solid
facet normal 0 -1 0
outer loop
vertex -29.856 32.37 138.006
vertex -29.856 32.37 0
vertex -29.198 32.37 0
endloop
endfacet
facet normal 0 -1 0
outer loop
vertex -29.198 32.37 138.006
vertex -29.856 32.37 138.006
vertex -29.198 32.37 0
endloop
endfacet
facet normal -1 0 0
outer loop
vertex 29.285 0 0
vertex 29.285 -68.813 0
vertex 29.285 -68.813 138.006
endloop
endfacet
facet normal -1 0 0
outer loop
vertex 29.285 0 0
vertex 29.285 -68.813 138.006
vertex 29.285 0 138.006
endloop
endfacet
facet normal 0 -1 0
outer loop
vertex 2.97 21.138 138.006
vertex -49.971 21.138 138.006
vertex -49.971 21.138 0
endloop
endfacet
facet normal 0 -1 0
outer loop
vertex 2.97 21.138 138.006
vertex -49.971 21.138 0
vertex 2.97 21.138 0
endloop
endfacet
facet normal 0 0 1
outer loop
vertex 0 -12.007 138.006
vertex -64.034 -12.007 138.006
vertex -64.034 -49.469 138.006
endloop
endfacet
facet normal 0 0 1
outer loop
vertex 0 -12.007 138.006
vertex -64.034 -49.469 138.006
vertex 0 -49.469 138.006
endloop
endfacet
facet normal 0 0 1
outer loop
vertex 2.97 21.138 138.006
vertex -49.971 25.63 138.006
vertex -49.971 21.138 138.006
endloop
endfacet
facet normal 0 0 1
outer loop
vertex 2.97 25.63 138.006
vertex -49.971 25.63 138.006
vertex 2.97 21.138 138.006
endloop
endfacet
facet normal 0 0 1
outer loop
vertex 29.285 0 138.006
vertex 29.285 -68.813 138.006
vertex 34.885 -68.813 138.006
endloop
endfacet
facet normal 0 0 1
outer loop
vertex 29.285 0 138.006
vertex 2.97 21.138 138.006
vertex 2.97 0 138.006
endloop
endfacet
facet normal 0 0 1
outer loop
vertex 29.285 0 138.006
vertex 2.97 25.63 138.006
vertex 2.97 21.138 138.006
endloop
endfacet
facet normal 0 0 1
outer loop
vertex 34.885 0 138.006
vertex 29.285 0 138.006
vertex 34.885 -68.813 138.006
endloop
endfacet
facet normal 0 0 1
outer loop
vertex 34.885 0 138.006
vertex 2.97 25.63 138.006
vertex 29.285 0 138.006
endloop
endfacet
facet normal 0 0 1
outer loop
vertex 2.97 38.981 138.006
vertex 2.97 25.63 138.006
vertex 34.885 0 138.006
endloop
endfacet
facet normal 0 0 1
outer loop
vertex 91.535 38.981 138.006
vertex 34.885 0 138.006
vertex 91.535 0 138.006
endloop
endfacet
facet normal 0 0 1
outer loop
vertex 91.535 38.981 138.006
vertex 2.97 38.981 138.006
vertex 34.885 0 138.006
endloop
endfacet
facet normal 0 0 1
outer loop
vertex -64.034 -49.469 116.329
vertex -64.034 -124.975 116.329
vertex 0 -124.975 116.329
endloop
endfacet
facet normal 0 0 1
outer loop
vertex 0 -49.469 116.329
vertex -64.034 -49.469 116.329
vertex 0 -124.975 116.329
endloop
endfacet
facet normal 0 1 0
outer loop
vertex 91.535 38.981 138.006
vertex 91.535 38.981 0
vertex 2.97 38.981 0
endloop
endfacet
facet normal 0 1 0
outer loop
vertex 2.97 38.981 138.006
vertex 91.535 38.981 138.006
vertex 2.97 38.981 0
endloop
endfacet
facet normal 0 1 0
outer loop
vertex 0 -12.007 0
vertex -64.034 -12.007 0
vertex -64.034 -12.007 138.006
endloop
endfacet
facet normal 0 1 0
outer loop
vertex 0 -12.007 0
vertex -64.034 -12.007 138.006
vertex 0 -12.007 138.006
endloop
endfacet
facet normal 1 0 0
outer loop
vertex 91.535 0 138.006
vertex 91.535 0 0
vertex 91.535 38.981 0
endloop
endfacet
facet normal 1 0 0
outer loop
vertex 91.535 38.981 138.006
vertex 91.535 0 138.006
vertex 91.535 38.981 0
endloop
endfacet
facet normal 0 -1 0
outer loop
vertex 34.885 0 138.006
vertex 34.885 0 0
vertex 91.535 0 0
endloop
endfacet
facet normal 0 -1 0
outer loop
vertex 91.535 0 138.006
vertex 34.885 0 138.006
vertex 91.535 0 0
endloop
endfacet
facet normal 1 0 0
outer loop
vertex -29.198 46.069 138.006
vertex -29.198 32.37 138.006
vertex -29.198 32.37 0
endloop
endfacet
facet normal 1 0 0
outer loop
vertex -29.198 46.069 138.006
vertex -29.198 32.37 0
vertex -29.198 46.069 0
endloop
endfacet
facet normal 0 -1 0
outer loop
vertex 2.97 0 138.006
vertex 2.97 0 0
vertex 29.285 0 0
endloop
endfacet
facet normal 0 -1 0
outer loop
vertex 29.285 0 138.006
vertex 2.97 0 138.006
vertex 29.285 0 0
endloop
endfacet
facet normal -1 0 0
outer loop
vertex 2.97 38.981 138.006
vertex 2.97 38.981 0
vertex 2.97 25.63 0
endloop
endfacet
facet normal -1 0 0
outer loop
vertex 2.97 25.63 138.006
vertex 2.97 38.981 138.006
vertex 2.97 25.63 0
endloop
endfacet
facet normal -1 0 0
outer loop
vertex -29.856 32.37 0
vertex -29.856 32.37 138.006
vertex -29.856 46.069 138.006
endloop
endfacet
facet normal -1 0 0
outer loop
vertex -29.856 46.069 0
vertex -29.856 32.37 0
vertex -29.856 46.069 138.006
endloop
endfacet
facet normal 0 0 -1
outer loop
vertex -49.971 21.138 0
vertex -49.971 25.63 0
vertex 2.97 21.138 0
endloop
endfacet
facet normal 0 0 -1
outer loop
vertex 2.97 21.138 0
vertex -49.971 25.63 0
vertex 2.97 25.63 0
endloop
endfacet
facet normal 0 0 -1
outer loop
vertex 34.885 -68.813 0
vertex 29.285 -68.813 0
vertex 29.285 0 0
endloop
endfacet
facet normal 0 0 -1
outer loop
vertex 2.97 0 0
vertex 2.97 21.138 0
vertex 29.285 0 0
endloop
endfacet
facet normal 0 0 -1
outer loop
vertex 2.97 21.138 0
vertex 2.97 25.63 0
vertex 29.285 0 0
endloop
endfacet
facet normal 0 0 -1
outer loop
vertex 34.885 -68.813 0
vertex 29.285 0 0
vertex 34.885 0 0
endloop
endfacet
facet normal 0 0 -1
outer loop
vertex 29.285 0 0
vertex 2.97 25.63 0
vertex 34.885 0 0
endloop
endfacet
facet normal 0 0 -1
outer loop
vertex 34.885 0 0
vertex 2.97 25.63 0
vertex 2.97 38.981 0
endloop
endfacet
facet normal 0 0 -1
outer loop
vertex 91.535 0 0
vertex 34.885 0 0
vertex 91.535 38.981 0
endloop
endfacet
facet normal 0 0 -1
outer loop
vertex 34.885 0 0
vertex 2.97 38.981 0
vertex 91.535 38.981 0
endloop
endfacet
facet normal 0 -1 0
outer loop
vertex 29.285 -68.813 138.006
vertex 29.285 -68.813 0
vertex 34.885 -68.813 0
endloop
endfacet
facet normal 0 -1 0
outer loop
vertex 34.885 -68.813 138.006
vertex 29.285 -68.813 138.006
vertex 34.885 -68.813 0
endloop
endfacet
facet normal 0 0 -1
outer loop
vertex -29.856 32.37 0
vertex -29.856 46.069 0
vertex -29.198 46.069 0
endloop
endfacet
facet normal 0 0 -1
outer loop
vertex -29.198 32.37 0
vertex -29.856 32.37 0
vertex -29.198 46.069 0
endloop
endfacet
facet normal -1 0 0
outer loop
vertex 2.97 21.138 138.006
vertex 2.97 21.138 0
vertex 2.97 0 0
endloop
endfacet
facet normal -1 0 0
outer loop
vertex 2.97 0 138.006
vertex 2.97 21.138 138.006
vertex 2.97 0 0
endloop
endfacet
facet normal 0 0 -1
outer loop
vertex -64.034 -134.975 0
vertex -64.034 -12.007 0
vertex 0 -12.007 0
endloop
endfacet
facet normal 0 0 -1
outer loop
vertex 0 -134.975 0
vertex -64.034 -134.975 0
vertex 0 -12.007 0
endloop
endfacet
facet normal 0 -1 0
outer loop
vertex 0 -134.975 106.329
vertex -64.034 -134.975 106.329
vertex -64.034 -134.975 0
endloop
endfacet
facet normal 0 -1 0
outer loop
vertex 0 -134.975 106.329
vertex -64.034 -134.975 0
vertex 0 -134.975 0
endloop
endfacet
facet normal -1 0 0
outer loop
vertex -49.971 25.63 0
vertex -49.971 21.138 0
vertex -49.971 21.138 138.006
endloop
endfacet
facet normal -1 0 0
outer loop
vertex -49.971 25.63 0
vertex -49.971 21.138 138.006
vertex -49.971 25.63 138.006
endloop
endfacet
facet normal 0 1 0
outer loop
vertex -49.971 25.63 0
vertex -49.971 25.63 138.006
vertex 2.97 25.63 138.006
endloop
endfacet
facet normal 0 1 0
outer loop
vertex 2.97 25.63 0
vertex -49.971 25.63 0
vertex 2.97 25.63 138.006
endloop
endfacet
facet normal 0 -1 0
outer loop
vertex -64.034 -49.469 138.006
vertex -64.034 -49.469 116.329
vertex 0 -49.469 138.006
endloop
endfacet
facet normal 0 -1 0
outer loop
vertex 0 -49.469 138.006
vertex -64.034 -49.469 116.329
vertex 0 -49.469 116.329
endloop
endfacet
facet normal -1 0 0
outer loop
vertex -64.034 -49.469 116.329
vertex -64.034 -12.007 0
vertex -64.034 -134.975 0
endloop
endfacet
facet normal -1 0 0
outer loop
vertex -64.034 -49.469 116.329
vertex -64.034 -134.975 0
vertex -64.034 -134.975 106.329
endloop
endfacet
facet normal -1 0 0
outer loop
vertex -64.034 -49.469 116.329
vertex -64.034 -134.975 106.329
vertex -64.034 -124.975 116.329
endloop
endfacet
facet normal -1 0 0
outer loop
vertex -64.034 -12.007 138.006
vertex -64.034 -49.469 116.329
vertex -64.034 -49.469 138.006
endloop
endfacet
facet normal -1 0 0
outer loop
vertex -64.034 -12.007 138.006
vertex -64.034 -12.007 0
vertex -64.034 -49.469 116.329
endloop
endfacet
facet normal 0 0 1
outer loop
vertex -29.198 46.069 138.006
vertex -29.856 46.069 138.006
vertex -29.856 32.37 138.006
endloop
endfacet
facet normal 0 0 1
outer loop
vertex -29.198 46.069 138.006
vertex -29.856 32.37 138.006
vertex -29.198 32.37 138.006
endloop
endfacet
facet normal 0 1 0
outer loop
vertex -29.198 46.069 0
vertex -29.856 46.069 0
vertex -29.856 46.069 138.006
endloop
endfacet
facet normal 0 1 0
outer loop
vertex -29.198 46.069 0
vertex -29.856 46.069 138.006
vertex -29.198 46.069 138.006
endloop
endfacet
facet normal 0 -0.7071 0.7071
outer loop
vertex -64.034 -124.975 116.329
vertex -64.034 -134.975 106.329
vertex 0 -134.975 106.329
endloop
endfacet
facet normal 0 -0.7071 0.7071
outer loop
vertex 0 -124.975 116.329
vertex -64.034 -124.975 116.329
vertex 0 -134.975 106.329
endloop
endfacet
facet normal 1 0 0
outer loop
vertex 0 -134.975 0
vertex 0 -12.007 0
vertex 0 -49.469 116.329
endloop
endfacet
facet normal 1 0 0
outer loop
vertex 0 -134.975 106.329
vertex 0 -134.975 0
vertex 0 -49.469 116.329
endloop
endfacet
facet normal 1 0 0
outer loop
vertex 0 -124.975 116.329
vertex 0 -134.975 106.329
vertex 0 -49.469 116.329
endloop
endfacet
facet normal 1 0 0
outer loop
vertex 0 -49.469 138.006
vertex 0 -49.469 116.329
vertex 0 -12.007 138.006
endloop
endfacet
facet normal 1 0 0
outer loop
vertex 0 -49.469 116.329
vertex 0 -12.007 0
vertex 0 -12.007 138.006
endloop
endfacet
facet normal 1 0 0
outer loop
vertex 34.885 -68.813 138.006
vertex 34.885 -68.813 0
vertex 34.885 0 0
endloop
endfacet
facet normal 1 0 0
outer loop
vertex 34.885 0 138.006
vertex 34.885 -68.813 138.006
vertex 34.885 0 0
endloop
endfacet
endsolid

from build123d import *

# Parameters (mm, degrees)
F0_W     = 64.0341192484
F0_H     = 37.4616123736
F1_DEPTH = 116.3293346763
F2_DEPTH = 85.5063274503
F3_SIZE  = 10
F0_W_2   = 5.6003332138
F0_H_2   = 33.2702100277
F0_H_3   = 68.8130073249
F0_W_3   = 23.4771911055
F0_H_4   = 4.4920668006
F0_W_4   = 52.9409237206
F4_DEPTH = 138.0061507225
F0_W_5   = 0.6573721766
F0_H_5   = 13.6995092034


with BuildPart() as f1:
    # F0 (on Top) → F1 (new body)
    with BuildSketch(Plane.XY):
        with Locations((-32.0170596242, -30.7380165905)):
            Rectangle(F0_W, F0_H)
    extrude(amount=F1_DEPTH)

    # F2 (add): a face of the model
    f2_faces = [f1.faces().sort_by_distance(p)[0] for p in [
        (-32.0170596242, -49.4688227773, 58.1646673381),
    ]]
    extrude(f2_faces, amount=F2_DEPTH)

    # F3
    f3_edges = [f1.edges().sort_by_distance(p)[0] for p in [
        (-32.01706, -134.97515, 116.329335),
    ]]
    chamfer(f3_edges, length=F3_SIZE)

    # F0 (on Top) → F4, piece 3 (join)
    with BuildSketch(Plane.XY):
        with Locations((-32.0170596242, -30.7380165905)):
            Rectangle(F0_W, F0_H)
    extrude(amount=F4_DEPTH)


with BuildPart() as f4:
    # F0 (on Top) → F4 (new body)
    with BuildSketch(Plane.XY):
        with Locations((32.0847071707, 16.6351050138)):
            Rectangle(F0_W_2, F0_H_2)
        Polygon((29.2845405638, 33.2702100277), (34.8848737776, 33.2702100277), (34.8848737776, 0), (91.535128653, 0), (91.535128653, 38.980551064), (2.96985358, 38.980551064), (2.96985358, 25.6301015615), (26.4470446855, 25.6301015615), (26.4470446855, 21.138034761), (2.96985358, 21.138034761), (2.96985358, 0), (29.2845405638, 0), align=None)
        with Locations((32.0847071707, -34.4065036625)):
            Rectangle(F0_W_2, F0_H_3)
        with Locations((14.7084491327, 23.3840681612)):
            Rectangle(F0_W_3, F0_H_4)
        with Locations((-23.5006082803, 23.3840681612)):
            Rectangle(F0_W_4, F0_H_4)
    extrude(amount=F4_DEPTH)


with BuildPart() as f4b:
    # F0 (on Top) → F4, piece 2 (new body)
    with BuildSketch(Plane.XY):
        with Locations((-29.5269098133, 39.2192713916)):
            Rectangle(F0_W_5, F0_H_5)
    extrude(amount=F4_DEPTH)


solid = Compound([f1.part, f4.part, f4b.part])
